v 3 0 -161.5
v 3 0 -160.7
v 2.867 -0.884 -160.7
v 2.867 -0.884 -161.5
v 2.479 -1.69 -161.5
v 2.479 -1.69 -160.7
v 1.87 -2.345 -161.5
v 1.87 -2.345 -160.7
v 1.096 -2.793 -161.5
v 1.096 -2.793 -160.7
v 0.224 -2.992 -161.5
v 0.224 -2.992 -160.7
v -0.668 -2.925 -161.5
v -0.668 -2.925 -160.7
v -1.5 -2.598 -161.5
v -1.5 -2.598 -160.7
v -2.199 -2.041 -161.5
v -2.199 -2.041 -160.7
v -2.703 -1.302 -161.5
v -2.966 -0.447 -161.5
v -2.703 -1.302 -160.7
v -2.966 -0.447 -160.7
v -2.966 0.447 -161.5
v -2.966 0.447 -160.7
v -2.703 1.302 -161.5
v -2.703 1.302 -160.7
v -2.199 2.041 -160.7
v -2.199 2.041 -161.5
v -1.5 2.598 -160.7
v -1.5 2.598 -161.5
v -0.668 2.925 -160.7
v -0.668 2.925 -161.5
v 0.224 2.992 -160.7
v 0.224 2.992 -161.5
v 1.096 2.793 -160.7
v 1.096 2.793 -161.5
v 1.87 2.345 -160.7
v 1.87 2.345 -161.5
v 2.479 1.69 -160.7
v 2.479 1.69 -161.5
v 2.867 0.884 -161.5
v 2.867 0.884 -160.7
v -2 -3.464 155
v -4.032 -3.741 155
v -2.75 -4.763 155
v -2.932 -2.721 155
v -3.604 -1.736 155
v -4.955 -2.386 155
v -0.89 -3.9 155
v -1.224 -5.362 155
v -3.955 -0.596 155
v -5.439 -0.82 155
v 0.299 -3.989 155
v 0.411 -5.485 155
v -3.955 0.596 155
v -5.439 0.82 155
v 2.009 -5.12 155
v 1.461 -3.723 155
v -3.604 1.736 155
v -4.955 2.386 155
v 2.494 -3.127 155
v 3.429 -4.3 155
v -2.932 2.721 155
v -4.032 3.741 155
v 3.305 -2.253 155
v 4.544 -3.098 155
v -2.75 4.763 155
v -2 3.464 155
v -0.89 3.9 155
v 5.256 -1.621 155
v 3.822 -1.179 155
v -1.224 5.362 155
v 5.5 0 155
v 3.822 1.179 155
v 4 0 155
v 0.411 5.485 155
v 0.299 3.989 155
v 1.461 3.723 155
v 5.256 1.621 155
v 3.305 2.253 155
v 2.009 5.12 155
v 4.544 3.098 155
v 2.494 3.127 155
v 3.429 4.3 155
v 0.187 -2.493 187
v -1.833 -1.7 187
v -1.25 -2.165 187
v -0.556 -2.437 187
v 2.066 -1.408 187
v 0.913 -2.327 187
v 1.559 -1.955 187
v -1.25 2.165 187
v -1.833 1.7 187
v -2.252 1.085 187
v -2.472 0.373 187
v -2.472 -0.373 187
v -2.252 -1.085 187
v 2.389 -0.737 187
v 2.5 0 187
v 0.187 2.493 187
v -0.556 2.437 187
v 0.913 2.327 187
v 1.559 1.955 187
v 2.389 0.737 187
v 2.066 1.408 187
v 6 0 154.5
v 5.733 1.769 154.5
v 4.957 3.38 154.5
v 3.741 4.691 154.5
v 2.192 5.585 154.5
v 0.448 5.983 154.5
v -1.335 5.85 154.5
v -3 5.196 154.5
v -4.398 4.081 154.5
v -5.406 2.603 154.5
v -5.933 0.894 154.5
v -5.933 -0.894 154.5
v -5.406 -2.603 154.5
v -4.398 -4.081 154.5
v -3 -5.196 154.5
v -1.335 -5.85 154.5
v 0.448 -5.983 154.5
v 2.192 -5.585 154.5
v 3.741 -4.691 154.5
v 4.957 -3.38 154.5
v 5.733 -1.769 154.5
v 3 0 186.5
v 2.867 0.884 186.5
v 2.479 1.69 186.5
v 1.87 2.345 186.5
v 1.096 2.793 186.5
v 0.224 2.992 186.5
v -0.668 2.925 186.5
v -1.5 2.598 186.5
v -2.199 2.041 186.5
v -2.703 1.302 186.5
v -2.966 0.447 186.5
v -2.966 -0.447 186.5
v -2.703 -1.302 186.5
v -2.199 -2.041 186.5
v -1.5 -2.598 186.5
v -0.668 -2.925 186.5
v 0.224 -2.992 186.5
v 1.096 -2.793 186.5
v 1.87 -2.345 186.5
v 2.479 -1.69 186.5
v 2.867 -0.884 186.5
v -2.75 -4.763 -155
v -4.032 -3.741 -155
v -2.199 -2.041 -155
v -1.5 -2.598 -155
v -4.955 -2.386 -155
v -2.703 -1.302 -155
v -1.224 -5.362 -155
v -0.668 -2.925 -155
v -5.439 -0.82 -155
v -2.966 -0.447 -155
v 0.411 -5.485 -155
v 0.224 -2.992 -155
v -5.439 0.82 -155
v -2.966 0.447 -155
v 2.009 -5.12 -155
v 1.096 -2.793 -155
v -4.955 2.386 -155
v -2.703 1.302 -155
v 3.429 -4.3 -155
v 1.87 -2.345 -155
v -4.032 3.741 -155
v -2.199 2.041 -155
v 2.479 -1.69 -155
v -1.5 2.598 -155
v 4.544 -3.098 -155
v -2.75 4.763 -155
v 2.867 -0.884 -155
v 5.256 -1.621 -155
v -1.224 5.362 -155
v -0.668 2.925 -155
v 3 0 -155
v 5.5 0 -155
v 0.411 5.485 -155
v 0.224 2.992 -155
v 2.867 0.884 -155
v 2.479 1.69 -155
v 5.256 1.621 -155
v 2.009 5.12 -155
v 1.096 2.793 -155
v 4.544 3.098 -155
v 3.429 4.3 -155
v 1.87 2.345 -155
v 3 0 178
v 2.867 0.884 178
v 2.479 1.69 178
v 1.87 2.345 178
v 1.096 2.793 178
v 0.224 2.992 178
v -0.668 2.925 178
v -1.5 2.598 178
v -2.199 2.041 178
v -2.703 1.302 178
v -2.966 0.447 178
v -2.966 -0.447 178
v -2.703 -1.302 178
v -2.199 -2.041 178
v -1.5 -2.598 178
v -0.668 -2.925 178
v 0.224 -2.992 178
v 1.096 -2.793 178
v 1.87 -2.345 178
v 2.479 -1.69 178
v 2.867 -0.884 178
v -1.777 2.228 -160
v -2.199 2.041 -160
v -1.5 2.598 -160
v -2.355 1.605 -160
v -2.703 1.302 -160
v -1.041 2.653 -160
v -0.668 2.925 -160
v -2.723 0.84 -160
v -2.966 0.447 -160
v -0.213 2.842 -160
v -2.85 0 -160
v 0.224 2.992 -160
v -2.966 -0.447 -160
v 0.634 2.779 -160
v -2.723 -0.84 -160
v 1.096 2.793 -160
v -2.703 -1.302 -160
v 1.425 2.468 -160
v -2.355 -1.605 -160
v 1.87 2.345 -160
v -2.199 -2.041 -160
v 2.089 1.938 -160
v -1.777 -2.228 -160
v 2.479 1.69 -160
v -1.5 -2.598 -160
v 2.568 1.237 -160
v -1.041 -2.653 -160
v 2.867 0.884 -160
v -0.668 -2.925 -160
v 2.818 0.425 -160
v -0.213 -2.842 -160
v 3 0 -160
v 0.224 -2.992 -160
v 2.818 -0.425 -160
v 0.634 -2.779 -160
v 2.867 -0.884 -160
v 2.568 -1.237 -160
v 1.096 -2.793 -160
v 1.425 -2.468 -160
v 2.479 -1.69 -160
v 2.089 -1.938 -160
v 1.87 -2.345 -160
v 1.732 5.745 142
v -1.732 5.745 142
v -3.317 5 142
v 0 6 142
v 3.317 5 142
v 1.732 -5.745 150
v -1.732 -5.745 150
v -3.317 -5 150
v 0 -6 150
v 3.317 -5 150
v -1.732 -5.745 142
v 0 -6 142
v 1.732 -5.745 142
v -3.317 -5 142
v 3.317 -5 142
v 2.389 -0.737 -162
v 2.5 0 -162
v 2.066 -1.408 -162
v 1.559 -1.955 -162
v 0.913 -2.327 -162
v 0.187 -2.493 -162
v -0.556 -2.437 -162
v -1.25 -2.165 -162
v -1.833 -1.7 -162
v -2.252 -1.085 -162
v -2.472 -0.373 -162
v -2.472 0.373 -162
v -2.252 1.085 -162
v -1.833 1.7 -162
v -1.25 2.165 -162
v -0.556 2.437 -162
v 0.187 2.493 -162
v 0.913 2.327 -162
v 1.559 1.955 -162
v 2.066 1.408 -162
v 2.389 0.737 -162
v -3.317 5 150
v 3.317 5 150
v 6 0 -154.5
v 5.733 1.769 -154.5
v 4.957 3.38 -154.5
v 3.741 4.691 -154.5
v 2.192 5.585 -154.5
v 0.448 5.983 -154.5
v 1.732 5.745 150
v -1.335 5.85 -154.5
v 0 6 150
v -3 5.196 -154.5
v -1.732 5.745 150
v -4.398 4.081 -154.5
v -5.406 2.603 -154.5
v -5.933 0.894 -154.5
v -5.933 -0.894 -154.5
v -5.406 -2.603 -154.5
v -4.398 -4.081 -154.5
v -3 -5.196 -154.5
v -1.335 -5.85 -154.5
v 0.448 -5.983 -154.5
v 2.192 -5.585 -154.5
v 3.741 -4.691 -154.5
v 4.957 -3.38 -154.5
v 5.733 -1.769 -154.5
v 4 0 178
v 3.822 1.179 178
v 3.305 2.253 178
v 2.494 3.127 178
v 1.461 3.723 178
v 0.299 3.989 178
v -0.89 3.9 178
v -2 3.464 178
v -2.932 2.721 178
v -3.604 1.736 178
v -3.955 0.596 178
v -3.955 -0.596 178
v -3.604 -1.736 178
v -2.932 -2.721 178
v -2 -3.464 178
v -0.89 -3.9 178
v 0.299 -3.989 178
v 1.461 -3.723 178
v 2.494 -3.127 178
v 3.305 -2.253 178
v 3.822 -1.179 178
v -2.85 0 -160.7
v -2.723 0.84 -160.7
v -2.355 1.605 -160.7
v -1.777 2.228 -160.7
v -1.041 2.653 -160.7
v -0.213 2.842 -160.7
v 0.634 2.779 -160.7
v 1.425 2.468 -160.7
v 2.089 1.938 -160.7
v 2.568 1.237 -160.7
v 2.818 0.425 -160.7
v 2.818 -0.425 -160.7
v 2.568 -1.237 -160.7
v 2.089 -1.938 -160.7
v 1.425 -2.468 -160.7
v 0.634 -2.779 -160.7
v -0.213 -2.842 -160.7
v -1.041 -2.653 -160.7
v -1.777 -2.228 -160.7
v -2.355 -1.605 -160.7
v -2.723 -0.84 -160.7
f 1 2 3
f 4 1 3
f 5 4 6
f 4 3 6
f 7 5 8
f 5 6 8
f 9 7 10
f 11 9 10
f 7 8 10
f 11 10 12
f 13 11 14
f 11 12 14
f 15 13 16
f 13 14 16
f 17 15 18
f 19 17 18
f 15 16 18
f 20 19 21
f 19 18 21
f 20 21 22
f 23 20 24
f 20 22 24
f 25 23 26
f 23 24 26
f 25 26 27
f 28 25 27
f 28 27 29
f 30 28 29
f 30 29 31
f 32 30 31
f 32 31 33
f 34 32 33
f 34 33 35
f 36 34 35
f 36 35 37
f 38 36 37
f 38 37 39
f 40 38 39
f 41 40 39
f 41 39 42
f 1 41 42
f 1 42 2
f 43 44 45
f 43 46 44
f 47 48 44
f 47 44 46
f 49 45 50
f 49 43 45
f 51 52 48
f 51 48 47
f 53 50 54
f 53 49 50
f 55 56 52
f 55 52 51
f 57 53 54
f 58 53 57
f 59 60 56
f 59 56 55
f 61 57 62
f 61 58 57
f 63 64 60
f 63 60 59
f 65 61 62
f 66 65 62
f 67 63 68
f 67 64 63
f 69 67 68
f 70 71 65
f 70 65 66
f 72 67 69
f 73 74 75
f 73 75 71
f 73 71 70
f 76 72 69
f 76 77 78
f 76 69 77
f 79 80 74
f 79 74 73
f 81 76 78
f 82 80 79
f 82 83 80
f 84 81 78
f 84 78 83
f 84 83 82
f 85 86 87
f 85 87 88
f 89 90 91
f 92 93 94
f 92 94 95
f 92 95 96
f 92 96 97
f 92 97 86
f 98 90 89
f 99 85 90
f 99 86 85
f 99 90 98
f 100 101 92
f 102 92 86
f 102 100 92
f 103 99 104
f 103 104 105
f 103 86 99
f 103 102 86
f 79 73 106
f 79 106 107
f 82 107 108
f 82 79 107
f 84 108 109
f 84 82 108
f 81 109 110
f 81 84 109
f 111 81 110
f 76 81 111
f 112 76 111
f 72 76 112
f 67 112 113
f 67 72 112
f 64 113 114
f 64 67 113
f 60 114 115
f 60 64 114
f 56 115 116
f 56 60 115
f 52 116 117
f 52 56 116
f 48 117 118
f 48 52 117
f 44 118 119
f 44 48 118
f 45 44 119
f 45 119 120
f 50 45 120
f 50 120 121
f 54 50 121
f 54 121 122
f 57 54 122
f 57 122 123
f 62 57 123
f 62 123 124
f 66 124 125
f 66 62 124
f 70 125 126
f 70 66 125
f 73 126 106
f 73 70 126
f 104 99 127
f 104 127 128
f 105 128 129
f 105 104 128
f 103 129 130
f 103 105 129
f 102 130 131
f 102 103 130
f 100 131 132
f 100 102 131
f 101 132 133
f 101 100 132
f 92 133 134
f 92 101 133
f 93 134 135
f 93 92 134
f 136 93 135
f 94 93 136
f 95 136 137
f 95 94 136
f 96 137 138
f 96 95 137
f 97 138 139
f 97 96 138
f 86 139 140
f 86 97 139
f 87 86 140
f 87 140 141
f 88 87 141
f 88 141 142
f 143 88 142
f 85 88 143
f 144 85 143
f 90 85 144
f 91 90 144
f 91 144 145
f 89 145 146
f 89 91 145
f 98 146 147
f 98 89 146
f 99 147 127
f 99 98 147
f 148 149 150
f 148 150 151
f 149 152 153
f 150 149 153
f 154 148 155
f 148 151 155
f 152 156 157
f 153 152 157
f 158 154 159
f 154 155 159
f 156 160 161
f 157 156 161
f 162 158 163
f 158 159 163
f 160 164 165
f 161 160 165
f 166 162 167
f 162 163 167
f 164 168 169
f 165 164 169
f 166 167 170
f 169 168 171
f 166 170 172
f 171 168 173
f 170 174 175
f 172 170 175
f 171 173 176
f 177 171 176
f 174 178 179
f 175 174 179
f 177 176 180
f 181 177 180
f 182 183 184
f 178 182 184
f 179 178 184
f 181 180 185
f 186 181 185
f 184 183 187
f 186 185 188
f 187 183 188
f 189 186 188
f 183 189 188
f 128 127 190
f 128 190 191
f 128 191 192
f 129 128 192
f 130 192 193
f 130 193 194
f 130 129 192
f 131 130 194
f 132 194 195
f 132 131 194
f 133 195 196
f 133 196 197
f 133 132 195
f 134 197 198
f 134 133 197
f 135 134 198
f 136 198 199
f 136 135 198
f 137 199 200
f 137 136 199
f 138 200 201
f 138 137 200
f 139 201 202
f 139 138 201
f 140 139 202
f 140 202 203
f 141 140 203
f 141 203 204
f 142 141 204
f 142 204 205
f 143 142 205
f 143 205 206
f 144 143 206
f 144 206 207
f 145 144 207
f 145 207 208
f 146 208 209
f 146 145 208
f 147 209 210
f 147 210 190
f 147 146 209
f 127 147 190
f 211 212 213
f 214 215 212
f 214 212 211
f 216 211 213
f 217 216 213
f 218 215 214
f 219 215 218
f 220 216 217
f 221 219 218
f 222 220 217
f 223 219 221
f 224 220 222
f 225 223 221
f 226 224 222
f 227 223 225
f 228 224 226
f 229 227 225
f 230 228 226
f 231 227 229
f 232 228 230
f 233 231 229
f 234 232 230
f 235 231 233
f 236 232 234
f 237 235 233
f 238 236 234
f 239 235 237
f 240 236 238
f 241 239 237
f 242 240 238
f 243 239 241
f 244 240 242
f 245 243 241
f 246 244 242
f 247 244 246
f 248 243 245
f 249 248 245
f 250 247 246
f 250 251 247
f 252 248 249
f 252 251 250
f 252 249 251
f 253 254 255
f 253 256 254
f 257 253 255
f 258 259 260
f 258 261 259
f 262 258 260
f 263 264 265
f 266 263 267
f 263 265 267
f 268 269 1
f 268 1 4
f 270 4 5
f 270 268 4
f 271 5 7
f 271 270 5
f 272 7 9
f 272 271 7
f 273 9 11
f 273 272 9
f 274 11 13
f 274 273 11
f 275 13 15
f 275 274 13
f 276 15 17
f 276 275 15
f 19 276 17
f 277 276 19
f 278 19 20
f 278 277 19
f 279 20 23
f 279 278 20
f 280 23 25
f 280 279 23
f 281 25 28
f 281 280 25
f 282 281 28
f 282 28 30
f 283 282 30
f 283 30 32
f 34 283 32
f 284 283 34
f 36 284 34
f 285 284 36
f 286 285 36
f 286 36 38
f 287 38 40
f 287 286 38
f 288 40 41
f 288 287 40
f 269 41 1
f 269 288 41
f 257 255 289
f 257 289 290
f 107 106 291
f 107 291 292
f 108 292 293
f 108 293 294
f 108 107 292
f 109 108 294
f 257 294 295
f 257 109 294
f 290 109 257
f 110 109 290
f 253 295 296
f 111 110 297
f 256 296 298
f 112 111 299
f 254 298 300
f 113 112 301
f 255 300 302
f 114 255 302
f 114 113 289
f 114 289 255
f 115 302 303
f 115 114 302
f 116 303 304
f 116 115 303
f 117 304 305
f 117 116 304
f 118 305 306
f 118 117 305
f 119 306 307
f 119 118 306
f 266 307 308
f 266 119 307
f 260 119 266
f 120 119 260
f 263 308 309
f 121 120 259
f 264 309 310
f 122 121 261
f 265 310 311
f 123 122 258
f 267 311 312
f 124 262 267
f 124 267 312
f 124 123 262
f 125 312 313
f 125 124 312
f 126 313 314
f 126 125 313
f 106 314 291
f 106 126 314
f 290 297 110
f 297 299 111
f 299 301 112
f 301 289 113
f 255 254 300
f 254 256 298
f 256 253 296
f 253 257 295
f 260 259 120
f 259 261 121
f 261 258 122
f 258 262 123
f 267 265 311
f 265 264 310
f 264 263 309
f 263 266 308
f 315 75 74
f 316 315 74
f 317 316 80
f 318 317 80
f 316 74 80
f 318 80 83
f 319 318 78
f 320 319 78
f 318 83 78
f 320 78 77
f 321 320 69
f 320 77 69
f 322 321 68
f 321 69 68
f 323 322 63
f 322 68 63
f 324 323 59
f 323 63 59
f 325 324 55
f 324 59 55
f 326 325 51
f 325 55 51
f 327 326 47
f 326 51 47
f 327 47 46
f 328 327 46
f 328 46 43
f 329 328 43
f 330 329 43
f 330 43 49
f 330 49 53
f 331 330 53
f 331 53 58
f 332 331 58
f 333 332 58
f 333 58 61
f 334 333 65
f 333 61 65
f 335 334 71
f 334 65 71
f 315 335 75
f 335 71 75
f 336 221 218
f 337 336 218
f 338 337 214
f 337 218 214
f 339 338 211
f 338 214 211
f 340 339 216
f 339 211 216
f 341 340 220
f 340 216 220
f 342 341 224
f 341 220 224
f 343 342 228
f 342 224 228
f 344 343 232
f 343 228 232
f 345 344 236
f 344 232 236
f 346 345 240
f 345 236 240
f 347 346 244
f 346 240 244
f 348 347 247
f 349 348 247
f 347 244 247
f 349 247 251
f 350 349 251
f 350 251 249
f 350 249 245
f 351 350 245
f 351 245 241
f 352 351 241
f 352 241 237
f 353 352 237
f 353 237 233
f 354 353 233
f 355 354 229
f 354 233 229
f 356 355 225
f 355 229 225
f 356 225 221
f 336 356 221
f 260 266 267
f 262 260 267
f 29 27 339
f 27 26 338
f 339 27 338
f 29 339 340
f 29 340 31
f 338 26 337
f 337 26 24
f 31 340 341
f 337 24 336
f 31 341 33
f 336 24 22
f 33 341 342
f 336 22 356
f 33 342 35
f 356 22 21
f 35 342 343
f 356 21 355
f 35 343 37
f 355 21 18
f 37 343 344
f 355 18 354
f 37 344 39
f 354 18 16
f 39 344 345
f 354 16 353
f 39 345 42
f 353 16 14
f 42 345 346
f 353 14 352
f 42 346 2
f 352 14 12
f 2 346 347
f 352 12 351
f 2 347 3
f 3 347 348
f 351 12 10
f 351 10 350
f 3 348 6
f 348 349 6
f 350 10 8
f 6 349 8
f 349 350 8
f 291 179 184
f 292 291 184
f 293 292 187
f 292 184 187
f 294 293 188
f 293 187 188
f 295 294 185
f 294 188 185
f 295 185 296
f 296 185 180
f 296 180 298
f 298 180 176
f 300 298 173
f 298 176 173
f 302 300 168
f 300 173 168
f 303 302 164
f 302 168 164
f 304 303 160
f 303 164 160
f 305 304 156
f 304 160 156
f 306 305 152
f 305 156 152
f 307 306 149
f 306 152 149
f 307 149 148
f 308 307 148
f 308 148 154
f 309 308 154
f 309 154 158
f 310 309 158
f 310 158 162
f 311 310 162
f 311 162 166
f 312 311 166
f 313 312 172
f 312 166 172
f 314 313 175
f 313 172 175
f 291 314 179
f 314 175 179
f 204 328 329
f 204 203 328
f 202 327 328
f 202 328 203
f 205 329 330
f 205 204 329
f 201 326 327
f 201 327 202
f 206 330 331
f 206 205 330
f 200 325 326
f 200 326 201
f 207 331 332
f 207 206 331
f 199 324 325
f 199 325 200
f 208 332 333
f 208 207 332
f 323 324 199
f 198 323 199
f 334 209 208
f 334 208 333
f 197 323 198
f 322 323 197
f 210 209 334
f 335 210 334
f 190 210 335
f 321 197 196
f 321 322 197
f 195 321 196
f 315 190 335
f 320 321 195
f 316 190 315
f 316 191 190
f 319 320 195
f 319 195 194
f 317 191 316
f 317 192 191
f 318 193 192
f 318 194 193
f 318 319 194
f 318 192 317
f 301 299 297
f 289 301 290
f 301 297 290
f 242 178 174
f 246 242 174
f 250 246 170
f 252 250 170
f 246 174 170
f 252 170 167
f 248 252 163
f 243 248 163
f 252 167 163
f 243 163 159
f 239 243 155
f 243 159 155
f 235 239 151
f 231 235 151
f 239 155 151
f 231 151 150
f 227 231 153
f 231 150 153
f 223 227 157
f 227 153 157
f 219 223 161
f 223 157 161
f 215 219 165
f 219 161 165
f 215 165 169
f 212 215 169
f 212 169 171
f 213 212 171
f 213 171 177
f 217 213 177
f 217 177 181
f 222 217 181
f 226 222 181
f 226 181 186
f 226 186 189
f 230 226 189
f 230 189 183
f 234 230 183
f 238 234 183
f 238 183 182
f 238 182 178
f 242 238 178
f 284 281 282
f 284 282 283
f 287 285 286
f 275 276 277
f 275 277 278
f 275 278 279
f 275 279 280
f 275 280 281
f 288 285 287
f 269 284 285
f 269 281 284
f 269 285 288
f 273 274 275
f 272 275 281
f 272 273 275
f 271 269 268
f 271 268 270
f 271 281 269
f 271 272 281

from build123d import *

# Parameters (mm, degrees)
SKETCH_1_R          = 6
EXTRUDE_1_DEPTH     = 155
SKETCH_2_R          = 3
EXTRUDE_2_DEPTH     = 7
CUT_EXTRUDE_START   = 5
SKETCH_3_R          = 3
SKETCH_3_R_2        = 2.85
CUT_EXTRUDE_1_DEPTH = 0.7
SKETCH_4_R          = 4
EXTRUDE_3_DEPTH     = 23
EXTRUDE_START       = 9
SKETCH_5_R          = 3
EXTRUDE_4_DEPTH     = 9
CHAMFER_1_SIZE      = 0.5
SKETCH_6_W          = 9.301869948
SKETCH_6_H          = 8
CUT_EXTRUDE_2_DEPTH = 1


with BuildPart() as part:
    # 草图1 → 凸台-拉伸1 (new, symmetric)
    with BuildSketch(Plane.XY):
        Circle(SKETCH_1_R)
    extrude(amount=EXTRUDE_1_DEPTH, both=True)

    # 草图2 → 凸台-拉伸2 (add)
    with BuildSketch(Plane(origin=(0, 0, -155), x_dir=(-1, 0, 0), z_dir=(0, 0, -1))):
        with Locations(Location((0, 0, 0), (0, 0, 180))):
            Circle(SKETCH_2_R)
    extrude(amount=EXTRUDE_2_DEPTH)

    # 草图3 → 切除-拉伸1 (cut)
    with BuildSketch(Plane(origin=(0, 0, -155), x_dir=(-1, 0, 0), z_dir=(0, 0, -1)).offset(CUT_EXTRUDE_START)):
        with Locations(Location((0, 0, 0), (0, 0, 180))):
            Circle(SKETCH_3_R)
        Circle(SKETCH_3_R_2, mode=Mode.SUBTRACT)
    extrude(amount=CUT_EXTRUDE_1_DEPTH, mode=Mode.SUBTRACT)

    # 草图4 → 凸台-拉伸3 (add)
    with BuildSketch(Plane.XY.offset(155)):
        Circle(SKETCH_4_R)
    extrude(amount=EXTRUDE_3_DEPTH)

    # 草图5 → 凸台-拉伸4 (add)
    with BuildSketch(Plane.XY.offset(178).offset(EXTRUDE_START)):
        Circle(SKETCH_5_R)
    extrude(amount=-EXTRUDE_4_DEPTH)

    # 倒角1
    chamfer_1_edges = [part.edges().sort_by_distance(p)[0] for p in [
        (-6, 0, -155),
        (-3, 0, 187),
        (-6, 0, 155),
        (-3, 0, -162),
    ]]
    chamfer(chamfer_1_edges, length=CHAMFER_1_SIZE)

    # 草图6 → 切除-拉伸2 (cut)
    with BuildSketch(Plane(origin=(0, 6, 0), x_dir=(1, 0, 0), z_dir=(0, 1, 0))):
        with Locations((0, -146)):
            Rectangle(SKETCH_6_W, SKETCH_6_H)
    cut_extrude_2 = extrude(amount=-CUT_EXTRUDE_2_DEPTH, mode=Mode.SUBTRACT)

    # 镜向1: 切除-拉伸2 across plane
    add(cut_extrude_2.mirror(Plane.ZX), mode=Mode.SUBTRACT)


solid = part.part
